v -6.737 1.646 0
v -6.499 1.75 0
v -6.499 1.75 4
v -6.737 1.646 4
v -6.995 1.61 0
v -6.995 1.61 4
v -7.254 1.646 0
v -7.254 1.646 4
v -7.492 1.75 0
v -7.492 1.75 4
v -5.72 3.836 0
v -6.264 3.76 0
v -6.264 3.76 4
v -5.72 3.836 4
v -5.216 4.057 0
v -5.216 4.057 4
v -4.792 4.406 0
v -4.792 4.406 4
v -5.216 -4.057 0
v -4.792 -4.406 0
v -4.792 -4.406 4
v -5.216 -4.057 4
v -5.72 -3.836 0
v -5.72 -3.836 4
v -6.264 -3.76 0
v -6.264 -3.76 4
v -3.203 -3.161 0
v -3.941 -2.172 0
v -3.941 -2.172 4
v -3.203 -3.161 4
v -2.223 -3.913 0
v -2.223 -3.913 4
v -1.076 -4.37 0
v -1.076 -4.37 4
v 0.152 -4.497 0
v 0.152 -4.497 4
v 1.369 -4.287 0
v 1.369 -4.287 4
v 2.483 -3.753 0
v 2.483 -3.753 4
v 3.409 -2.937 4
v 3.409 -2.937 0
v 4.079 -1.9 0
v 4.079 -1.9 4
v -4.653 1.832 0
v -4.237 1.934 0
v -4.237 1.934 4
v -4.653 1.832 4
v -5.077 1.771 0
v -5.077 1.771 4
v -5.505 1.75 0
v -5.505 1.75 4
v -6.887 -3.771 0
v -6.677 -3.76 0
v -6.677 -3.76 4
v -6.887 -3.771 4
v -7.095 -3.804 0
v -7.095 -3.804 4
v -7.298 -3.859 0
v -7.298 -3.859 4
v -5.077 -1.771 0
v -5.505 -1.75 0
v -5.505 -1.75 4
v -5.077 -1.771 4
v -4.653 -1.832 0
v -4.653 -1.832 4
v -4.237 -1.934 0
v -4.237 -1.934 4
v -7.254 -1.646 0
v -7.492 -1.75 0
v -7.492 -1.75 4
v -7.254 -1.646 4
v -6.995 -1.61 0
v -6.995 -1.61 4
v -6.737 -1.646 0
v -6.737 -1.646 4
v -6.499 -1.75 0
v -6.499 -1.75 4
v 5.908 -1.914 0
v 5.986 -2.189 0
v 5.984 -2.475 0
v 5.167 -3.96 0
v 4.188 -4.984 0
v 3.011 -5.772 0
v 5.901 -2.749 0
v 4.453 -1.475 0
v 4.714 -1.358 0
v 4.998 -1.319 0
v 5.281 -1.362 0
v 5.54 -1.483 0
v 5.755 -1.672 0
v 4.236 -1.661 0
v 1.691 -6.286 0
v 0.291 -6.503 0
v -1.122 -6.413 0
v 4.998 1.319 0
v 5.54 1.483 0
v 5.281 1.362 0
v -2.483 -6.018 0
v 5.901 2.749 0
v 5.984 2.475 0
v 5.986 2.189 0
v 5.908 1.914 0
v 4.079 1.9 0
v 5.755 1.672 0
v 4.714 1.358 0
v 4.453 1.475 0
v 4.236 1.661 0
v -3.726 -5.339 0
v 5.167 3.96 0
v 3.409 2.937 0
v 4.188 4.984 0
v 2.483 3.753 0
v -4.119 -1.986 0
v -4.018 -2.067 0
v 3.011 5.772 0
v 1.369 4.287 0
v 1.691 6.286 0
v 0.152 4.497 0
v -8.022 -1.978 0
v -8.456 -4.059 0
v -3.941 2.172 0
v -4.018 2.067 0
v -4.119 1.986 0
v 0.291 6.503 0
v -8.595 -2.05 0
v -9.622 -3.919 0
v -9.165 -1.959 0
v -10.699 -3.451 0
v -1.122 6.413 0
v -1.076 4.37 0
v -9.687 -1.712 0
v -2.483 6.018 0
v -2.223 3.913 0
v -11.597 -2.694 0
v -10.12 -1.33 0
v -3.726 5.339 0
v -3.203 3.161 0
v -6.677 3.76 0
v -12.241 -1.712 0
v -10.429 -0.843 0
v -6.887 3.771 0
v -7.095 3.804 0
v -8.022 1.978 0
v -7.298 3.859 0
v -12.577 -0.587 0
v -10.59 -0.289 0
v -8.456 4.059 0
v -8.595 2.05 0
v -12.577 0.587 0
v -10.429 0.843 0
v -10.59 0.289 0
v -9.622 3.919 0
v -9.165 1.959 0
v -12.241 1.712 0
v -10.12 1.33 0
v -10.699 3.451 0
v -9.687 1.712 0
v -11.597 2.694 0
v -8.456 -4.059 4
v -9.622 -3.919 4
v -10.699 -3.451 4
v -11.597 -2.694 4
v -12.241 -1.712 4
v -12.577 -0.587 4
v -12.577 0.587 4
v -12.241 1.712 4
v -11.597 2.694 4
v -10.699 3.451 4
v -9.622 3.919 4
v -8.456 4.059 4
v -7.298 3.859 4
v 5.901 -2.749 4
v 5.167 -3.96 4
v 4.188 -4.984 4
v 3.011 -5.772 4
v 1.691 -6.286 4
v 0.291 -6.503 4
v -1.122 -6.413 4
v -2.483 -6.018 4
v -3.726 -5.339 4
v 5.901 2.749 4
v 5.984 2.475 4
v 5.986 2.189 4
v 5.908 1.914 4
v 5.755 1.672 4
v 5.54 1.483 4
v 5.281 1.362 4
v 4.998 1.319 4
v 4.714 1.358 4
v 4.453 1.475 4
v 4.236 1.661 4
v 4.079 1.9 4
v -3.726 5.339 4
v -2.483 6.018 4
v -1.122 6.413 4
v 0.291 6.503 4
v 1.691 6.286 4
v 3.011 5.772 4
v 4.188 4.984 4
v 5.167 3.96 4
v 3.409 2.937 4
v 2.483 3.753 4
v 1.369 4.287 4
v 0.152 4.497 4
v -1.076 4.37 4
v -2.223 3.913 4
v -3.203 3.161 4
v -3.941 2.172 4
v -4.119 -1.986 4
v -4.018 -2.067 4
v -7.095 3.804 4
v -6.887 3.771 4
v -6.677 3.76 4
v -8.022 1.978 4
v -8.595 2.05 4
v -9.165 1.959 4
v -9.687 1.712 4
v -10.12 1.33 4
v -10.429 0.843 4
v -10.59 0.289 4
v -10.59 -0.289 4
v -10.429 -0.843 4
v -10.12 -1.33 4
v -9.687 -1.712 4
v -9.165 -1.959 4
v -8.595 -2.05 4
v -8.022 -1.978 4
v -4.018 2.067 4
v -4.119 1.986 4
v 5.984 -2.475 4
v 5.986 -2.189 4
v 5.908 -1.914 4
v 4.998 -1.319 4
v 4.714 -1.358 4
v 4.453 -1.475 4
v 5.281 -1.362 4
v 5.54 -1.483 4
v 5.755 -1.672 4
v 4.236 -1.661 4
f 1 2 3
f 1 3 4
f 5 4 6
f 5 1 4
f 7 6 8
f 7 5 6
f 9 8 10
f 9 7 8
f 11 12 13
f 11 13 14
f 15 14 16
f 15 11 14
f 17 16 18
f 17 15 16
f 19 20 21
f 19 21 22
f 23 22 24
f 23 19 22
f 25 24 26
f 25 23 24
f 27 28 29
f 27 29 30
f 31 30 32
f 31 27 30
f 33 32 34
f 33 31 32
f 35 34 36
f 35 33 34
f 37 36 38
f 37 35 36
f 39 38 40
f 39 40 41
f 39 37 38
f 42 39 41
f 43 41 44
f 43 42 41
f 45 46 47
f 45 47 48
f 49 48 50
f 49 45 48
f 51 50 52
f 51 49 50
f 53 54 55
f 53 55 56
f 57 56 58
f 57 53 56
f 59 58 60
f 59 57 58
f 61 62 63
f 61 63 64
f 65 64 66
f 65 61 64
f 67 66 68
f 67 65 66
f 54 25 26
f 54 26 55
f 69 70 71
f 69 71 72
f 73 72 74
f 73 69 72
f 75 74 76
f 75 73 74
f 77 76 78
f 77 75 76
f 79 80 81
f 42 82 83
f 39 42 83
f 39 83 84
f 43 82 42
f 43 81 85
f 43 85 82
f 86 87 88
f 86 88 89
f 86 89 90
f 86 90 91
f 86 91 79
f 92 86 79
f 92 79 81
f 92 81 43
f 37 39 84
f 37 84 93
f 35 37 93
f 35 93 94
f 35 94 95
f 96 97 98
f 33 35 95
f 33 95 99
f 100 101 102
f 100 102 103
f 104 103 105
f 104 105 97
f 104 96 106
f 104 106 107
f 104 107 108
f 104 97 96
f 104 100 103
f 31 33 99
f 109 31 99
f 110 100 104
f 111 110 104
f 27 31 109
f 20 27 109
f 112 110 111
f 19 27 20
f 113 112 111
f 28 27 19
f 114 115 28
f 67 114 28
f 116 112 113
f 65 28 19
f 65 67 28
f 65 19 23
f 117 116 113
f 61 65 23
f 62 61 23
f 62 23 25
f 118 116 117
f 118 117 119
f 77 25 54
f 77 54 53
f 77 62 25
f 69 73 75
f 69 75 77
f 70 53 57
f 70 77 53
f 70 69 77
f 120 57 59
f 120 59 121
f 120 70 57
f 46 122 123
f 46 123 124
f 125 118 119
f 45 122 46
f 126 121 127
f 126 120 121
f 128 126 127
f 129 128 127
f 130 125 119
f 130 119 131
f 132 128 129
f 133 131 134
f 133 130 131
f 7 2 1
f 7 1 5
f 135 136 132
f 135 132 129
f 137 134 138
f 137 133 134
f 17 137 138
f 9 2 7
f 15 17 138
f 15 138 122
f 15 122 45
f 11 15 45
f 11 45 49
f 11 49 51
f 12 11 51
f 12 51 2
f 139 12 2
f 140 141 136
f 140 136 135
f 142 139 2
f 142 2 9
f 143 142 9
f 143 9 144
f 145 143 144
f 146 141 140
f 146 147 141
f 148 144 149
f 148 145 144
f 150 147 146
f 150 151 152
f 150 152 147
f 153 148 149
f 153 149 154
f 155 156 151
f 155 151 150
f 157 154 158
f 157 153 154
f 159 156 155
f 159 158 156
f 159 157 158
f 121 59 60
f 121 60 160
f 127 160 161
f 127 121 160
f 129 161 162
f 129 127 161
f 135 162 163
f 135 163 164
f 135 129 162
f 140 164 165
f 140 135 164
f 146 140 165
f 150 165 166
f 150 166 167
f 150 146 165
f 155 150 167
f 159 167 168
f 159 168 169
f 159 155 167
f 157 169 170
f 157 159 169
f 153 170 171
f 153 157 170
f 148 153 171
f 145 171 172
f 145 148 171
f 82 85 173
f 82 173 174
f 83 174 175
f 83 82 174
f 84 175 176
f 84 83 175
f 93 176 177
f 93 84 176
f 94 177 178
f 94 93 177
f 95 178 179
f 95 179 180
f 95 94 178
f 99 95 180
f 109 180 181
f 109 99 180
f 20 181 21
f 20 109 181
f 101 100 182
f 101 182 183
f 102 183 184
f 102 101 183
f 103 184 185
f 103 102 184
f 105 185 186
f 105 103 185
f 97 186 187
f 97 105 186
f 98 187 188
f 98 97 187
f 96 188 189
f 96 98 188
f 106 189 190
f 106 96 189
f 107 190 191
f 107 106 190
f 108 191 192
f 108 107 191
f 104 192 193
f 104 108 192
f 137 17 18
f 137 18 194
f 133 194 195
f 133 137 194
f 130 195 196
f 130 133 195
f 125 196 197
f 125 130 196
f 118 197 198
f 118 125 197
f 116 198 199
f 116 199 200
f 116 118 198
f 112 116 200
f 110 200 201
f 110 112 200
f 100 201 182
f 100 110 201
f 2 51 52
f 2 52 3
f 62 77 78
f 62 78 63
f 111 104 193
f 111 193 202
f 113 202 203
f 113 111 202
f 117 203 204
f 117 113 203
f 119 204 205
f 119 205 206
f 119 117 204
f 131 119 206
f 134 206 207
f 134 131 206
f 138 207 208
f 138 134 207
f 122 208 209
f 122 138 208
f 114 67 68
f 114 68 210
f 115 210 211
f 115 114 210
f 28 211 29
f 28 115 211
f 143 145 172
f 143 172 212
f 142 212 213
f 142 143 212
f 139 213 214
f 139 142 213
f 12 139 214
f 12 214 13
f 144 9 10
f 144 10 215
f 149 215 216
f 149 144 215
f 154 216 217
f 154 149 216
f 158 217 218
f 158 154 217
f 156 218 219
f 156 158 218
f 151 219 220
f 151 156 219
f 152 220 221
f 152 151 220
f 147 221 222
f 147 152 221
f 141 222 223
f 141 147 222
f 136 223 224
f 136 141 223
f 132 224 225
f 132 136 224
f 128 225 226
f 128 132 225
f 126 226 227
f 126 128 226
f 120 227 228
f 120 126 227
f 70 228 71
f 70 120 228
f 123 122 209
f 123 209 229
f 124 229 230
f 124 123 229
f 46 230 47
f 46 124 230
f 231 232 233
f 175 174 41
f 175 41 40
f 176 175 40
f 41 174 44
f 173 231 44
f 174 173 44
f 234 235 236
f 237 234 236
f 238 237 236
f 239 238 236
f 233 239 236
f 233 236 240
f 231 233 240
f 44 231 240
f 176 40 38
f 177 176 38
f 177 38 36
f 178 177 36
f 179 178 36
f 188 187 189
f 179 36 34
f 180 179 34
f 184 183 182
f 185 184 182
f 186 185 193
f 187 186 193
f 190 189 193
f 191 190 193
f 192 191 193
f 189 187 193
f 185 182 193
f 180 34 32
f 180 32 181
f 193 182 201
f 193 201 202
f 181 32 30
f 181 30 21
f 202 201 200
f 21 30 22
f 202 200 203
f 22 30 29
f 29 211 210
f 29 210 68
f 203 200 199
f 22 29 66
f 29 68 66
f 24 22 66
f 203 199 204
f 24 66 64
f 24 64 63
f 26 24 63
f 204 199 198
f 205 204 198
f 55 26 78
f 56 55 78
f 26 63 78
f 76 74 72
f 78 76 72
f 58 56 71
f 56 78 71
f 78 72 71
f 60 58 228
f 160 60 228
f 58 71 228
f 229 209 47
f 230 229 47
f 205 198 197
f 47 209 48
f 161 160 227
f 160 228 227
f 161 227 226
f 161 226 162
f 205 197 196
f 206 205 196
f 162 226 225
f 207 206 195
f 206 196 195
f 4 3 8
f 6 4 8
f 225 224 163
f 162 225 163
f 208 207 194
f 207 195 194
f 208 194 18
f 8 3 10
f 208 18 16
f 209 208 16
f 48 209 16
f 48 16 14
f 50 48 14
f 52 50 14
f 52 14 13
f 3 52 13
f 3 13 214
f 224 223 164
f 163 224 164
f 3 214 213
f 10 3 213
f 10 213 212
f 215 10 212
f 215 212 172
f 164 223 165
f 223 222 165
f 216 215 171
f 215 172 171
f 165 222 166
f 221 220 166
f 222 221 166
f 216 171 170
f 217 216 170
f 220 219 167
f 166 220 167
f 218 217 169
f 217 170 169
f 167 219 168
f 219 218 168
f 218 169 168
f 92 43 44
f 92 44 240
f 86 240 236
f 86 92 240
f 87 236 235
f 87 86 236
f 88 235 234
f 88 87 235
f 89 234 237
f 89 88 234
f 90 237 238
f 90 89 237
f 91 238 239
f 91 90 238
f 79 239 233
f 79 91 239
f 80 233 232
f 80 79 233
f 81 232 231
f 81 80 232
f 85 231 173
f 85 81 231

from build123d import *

# Parameters (mm, degrees)
BOSS_EXTRUDE1_DEPTH = 4


with BuildPart() as part:
    # Sketch1 → Boss-Extrude1 (new body)
    with BuildSketch(Plane.XY):
        with BuildLine():
            Line((-6.676917421, 3.76), (-6.264383449, 3.76))
            ThreePointArc((-6.264383449, 3.76), (-5.460456542, 3.928688577), (-4.792142921, 4.406298472))
            ThreePointArc((-4.792142921, 4.406298472), (0.997233115, 6.433166103), (5.90126525, 2.748666667))
            ThreePointArc((5.90126525, 2.748666667), (5.414573764, 1.413308514), (4.079215611, 1.9))
            ThreePointArc((4.079215611, 1.9), (0.152344996, 4.497420483), (-3.941291901, 2.171685556))
            ThreePointArc((-3.941291901, 2.171685556), (-4.065842636, 2.023370199), (-4.237411909, 1.933513005))
            ThreePointArc((-4.237411909, 1.933513005), (-4.864598448, 1.796116159), (-5.505, 1.75))
            Line((-5.505, 1.75), (-6.498646087, 1.75))
            ThreePointArc((-6.498646087, 1.75), (-6.995469131, 1.610404776), (-7.492292175, 1.75))
            ThreePointArc((-7.492292175, 1.75), (-10.61, 0), (-7.492292175, -1.75))
            ThreePointArc((-7.492292175, -1.75), (-6.995469131, -1.610404776), (-6.498646087, -1.75))
            Line((-6.498646087, -1.75), (-5.505, -1.75))
            ThreePointArc((-5.505, -1.75), (-4.864598448, -1.796116159), (-4.237411909, -1.933513005))
            ThreePointArc((-4.237411909, -1.933513005), (-4.065842636, -2.023370199), (-3.941291901, -2.171685556))
            ThreePointArc((-3.941291901, -2.171685556), (0.152344996, -4.497420483), (4.079215611, -1.9))
            ThreePointArc((4.079215611, -1.9), (5.414573764, -1.413308514), (5.90126525, -2.748666667))
            ThreePointArc((5.90126525, -2.748666667), (0.997233115, -6.433166103), (-4.792142921, -4.406298472))
            ThreePointArc((-4.792142921, -4.406298472), (-5.460456542, -3.928688577), (-6.264383449, -3.76))
            Line((-6.264383449, -3.76), (-6.676917421, -3.76))
            ThreePointArc((-6.676917421, -3.76), (-6.991575809, -3.784907572), (-7.29839682, -3.859009901))
            ThreePointArc((-7.29839682, -3.859009901), (-12.62, 0), (-7.29839682, 3.859009901))
            ThreePointArc((-7.29839682, 3.859009901), (-6.991575809, 3.784907572), (-6.676917421, 3.76))
        make_face()
    extrude(amount=BOSS_EXTRUDE1_DEPTH)


solid = part.part
